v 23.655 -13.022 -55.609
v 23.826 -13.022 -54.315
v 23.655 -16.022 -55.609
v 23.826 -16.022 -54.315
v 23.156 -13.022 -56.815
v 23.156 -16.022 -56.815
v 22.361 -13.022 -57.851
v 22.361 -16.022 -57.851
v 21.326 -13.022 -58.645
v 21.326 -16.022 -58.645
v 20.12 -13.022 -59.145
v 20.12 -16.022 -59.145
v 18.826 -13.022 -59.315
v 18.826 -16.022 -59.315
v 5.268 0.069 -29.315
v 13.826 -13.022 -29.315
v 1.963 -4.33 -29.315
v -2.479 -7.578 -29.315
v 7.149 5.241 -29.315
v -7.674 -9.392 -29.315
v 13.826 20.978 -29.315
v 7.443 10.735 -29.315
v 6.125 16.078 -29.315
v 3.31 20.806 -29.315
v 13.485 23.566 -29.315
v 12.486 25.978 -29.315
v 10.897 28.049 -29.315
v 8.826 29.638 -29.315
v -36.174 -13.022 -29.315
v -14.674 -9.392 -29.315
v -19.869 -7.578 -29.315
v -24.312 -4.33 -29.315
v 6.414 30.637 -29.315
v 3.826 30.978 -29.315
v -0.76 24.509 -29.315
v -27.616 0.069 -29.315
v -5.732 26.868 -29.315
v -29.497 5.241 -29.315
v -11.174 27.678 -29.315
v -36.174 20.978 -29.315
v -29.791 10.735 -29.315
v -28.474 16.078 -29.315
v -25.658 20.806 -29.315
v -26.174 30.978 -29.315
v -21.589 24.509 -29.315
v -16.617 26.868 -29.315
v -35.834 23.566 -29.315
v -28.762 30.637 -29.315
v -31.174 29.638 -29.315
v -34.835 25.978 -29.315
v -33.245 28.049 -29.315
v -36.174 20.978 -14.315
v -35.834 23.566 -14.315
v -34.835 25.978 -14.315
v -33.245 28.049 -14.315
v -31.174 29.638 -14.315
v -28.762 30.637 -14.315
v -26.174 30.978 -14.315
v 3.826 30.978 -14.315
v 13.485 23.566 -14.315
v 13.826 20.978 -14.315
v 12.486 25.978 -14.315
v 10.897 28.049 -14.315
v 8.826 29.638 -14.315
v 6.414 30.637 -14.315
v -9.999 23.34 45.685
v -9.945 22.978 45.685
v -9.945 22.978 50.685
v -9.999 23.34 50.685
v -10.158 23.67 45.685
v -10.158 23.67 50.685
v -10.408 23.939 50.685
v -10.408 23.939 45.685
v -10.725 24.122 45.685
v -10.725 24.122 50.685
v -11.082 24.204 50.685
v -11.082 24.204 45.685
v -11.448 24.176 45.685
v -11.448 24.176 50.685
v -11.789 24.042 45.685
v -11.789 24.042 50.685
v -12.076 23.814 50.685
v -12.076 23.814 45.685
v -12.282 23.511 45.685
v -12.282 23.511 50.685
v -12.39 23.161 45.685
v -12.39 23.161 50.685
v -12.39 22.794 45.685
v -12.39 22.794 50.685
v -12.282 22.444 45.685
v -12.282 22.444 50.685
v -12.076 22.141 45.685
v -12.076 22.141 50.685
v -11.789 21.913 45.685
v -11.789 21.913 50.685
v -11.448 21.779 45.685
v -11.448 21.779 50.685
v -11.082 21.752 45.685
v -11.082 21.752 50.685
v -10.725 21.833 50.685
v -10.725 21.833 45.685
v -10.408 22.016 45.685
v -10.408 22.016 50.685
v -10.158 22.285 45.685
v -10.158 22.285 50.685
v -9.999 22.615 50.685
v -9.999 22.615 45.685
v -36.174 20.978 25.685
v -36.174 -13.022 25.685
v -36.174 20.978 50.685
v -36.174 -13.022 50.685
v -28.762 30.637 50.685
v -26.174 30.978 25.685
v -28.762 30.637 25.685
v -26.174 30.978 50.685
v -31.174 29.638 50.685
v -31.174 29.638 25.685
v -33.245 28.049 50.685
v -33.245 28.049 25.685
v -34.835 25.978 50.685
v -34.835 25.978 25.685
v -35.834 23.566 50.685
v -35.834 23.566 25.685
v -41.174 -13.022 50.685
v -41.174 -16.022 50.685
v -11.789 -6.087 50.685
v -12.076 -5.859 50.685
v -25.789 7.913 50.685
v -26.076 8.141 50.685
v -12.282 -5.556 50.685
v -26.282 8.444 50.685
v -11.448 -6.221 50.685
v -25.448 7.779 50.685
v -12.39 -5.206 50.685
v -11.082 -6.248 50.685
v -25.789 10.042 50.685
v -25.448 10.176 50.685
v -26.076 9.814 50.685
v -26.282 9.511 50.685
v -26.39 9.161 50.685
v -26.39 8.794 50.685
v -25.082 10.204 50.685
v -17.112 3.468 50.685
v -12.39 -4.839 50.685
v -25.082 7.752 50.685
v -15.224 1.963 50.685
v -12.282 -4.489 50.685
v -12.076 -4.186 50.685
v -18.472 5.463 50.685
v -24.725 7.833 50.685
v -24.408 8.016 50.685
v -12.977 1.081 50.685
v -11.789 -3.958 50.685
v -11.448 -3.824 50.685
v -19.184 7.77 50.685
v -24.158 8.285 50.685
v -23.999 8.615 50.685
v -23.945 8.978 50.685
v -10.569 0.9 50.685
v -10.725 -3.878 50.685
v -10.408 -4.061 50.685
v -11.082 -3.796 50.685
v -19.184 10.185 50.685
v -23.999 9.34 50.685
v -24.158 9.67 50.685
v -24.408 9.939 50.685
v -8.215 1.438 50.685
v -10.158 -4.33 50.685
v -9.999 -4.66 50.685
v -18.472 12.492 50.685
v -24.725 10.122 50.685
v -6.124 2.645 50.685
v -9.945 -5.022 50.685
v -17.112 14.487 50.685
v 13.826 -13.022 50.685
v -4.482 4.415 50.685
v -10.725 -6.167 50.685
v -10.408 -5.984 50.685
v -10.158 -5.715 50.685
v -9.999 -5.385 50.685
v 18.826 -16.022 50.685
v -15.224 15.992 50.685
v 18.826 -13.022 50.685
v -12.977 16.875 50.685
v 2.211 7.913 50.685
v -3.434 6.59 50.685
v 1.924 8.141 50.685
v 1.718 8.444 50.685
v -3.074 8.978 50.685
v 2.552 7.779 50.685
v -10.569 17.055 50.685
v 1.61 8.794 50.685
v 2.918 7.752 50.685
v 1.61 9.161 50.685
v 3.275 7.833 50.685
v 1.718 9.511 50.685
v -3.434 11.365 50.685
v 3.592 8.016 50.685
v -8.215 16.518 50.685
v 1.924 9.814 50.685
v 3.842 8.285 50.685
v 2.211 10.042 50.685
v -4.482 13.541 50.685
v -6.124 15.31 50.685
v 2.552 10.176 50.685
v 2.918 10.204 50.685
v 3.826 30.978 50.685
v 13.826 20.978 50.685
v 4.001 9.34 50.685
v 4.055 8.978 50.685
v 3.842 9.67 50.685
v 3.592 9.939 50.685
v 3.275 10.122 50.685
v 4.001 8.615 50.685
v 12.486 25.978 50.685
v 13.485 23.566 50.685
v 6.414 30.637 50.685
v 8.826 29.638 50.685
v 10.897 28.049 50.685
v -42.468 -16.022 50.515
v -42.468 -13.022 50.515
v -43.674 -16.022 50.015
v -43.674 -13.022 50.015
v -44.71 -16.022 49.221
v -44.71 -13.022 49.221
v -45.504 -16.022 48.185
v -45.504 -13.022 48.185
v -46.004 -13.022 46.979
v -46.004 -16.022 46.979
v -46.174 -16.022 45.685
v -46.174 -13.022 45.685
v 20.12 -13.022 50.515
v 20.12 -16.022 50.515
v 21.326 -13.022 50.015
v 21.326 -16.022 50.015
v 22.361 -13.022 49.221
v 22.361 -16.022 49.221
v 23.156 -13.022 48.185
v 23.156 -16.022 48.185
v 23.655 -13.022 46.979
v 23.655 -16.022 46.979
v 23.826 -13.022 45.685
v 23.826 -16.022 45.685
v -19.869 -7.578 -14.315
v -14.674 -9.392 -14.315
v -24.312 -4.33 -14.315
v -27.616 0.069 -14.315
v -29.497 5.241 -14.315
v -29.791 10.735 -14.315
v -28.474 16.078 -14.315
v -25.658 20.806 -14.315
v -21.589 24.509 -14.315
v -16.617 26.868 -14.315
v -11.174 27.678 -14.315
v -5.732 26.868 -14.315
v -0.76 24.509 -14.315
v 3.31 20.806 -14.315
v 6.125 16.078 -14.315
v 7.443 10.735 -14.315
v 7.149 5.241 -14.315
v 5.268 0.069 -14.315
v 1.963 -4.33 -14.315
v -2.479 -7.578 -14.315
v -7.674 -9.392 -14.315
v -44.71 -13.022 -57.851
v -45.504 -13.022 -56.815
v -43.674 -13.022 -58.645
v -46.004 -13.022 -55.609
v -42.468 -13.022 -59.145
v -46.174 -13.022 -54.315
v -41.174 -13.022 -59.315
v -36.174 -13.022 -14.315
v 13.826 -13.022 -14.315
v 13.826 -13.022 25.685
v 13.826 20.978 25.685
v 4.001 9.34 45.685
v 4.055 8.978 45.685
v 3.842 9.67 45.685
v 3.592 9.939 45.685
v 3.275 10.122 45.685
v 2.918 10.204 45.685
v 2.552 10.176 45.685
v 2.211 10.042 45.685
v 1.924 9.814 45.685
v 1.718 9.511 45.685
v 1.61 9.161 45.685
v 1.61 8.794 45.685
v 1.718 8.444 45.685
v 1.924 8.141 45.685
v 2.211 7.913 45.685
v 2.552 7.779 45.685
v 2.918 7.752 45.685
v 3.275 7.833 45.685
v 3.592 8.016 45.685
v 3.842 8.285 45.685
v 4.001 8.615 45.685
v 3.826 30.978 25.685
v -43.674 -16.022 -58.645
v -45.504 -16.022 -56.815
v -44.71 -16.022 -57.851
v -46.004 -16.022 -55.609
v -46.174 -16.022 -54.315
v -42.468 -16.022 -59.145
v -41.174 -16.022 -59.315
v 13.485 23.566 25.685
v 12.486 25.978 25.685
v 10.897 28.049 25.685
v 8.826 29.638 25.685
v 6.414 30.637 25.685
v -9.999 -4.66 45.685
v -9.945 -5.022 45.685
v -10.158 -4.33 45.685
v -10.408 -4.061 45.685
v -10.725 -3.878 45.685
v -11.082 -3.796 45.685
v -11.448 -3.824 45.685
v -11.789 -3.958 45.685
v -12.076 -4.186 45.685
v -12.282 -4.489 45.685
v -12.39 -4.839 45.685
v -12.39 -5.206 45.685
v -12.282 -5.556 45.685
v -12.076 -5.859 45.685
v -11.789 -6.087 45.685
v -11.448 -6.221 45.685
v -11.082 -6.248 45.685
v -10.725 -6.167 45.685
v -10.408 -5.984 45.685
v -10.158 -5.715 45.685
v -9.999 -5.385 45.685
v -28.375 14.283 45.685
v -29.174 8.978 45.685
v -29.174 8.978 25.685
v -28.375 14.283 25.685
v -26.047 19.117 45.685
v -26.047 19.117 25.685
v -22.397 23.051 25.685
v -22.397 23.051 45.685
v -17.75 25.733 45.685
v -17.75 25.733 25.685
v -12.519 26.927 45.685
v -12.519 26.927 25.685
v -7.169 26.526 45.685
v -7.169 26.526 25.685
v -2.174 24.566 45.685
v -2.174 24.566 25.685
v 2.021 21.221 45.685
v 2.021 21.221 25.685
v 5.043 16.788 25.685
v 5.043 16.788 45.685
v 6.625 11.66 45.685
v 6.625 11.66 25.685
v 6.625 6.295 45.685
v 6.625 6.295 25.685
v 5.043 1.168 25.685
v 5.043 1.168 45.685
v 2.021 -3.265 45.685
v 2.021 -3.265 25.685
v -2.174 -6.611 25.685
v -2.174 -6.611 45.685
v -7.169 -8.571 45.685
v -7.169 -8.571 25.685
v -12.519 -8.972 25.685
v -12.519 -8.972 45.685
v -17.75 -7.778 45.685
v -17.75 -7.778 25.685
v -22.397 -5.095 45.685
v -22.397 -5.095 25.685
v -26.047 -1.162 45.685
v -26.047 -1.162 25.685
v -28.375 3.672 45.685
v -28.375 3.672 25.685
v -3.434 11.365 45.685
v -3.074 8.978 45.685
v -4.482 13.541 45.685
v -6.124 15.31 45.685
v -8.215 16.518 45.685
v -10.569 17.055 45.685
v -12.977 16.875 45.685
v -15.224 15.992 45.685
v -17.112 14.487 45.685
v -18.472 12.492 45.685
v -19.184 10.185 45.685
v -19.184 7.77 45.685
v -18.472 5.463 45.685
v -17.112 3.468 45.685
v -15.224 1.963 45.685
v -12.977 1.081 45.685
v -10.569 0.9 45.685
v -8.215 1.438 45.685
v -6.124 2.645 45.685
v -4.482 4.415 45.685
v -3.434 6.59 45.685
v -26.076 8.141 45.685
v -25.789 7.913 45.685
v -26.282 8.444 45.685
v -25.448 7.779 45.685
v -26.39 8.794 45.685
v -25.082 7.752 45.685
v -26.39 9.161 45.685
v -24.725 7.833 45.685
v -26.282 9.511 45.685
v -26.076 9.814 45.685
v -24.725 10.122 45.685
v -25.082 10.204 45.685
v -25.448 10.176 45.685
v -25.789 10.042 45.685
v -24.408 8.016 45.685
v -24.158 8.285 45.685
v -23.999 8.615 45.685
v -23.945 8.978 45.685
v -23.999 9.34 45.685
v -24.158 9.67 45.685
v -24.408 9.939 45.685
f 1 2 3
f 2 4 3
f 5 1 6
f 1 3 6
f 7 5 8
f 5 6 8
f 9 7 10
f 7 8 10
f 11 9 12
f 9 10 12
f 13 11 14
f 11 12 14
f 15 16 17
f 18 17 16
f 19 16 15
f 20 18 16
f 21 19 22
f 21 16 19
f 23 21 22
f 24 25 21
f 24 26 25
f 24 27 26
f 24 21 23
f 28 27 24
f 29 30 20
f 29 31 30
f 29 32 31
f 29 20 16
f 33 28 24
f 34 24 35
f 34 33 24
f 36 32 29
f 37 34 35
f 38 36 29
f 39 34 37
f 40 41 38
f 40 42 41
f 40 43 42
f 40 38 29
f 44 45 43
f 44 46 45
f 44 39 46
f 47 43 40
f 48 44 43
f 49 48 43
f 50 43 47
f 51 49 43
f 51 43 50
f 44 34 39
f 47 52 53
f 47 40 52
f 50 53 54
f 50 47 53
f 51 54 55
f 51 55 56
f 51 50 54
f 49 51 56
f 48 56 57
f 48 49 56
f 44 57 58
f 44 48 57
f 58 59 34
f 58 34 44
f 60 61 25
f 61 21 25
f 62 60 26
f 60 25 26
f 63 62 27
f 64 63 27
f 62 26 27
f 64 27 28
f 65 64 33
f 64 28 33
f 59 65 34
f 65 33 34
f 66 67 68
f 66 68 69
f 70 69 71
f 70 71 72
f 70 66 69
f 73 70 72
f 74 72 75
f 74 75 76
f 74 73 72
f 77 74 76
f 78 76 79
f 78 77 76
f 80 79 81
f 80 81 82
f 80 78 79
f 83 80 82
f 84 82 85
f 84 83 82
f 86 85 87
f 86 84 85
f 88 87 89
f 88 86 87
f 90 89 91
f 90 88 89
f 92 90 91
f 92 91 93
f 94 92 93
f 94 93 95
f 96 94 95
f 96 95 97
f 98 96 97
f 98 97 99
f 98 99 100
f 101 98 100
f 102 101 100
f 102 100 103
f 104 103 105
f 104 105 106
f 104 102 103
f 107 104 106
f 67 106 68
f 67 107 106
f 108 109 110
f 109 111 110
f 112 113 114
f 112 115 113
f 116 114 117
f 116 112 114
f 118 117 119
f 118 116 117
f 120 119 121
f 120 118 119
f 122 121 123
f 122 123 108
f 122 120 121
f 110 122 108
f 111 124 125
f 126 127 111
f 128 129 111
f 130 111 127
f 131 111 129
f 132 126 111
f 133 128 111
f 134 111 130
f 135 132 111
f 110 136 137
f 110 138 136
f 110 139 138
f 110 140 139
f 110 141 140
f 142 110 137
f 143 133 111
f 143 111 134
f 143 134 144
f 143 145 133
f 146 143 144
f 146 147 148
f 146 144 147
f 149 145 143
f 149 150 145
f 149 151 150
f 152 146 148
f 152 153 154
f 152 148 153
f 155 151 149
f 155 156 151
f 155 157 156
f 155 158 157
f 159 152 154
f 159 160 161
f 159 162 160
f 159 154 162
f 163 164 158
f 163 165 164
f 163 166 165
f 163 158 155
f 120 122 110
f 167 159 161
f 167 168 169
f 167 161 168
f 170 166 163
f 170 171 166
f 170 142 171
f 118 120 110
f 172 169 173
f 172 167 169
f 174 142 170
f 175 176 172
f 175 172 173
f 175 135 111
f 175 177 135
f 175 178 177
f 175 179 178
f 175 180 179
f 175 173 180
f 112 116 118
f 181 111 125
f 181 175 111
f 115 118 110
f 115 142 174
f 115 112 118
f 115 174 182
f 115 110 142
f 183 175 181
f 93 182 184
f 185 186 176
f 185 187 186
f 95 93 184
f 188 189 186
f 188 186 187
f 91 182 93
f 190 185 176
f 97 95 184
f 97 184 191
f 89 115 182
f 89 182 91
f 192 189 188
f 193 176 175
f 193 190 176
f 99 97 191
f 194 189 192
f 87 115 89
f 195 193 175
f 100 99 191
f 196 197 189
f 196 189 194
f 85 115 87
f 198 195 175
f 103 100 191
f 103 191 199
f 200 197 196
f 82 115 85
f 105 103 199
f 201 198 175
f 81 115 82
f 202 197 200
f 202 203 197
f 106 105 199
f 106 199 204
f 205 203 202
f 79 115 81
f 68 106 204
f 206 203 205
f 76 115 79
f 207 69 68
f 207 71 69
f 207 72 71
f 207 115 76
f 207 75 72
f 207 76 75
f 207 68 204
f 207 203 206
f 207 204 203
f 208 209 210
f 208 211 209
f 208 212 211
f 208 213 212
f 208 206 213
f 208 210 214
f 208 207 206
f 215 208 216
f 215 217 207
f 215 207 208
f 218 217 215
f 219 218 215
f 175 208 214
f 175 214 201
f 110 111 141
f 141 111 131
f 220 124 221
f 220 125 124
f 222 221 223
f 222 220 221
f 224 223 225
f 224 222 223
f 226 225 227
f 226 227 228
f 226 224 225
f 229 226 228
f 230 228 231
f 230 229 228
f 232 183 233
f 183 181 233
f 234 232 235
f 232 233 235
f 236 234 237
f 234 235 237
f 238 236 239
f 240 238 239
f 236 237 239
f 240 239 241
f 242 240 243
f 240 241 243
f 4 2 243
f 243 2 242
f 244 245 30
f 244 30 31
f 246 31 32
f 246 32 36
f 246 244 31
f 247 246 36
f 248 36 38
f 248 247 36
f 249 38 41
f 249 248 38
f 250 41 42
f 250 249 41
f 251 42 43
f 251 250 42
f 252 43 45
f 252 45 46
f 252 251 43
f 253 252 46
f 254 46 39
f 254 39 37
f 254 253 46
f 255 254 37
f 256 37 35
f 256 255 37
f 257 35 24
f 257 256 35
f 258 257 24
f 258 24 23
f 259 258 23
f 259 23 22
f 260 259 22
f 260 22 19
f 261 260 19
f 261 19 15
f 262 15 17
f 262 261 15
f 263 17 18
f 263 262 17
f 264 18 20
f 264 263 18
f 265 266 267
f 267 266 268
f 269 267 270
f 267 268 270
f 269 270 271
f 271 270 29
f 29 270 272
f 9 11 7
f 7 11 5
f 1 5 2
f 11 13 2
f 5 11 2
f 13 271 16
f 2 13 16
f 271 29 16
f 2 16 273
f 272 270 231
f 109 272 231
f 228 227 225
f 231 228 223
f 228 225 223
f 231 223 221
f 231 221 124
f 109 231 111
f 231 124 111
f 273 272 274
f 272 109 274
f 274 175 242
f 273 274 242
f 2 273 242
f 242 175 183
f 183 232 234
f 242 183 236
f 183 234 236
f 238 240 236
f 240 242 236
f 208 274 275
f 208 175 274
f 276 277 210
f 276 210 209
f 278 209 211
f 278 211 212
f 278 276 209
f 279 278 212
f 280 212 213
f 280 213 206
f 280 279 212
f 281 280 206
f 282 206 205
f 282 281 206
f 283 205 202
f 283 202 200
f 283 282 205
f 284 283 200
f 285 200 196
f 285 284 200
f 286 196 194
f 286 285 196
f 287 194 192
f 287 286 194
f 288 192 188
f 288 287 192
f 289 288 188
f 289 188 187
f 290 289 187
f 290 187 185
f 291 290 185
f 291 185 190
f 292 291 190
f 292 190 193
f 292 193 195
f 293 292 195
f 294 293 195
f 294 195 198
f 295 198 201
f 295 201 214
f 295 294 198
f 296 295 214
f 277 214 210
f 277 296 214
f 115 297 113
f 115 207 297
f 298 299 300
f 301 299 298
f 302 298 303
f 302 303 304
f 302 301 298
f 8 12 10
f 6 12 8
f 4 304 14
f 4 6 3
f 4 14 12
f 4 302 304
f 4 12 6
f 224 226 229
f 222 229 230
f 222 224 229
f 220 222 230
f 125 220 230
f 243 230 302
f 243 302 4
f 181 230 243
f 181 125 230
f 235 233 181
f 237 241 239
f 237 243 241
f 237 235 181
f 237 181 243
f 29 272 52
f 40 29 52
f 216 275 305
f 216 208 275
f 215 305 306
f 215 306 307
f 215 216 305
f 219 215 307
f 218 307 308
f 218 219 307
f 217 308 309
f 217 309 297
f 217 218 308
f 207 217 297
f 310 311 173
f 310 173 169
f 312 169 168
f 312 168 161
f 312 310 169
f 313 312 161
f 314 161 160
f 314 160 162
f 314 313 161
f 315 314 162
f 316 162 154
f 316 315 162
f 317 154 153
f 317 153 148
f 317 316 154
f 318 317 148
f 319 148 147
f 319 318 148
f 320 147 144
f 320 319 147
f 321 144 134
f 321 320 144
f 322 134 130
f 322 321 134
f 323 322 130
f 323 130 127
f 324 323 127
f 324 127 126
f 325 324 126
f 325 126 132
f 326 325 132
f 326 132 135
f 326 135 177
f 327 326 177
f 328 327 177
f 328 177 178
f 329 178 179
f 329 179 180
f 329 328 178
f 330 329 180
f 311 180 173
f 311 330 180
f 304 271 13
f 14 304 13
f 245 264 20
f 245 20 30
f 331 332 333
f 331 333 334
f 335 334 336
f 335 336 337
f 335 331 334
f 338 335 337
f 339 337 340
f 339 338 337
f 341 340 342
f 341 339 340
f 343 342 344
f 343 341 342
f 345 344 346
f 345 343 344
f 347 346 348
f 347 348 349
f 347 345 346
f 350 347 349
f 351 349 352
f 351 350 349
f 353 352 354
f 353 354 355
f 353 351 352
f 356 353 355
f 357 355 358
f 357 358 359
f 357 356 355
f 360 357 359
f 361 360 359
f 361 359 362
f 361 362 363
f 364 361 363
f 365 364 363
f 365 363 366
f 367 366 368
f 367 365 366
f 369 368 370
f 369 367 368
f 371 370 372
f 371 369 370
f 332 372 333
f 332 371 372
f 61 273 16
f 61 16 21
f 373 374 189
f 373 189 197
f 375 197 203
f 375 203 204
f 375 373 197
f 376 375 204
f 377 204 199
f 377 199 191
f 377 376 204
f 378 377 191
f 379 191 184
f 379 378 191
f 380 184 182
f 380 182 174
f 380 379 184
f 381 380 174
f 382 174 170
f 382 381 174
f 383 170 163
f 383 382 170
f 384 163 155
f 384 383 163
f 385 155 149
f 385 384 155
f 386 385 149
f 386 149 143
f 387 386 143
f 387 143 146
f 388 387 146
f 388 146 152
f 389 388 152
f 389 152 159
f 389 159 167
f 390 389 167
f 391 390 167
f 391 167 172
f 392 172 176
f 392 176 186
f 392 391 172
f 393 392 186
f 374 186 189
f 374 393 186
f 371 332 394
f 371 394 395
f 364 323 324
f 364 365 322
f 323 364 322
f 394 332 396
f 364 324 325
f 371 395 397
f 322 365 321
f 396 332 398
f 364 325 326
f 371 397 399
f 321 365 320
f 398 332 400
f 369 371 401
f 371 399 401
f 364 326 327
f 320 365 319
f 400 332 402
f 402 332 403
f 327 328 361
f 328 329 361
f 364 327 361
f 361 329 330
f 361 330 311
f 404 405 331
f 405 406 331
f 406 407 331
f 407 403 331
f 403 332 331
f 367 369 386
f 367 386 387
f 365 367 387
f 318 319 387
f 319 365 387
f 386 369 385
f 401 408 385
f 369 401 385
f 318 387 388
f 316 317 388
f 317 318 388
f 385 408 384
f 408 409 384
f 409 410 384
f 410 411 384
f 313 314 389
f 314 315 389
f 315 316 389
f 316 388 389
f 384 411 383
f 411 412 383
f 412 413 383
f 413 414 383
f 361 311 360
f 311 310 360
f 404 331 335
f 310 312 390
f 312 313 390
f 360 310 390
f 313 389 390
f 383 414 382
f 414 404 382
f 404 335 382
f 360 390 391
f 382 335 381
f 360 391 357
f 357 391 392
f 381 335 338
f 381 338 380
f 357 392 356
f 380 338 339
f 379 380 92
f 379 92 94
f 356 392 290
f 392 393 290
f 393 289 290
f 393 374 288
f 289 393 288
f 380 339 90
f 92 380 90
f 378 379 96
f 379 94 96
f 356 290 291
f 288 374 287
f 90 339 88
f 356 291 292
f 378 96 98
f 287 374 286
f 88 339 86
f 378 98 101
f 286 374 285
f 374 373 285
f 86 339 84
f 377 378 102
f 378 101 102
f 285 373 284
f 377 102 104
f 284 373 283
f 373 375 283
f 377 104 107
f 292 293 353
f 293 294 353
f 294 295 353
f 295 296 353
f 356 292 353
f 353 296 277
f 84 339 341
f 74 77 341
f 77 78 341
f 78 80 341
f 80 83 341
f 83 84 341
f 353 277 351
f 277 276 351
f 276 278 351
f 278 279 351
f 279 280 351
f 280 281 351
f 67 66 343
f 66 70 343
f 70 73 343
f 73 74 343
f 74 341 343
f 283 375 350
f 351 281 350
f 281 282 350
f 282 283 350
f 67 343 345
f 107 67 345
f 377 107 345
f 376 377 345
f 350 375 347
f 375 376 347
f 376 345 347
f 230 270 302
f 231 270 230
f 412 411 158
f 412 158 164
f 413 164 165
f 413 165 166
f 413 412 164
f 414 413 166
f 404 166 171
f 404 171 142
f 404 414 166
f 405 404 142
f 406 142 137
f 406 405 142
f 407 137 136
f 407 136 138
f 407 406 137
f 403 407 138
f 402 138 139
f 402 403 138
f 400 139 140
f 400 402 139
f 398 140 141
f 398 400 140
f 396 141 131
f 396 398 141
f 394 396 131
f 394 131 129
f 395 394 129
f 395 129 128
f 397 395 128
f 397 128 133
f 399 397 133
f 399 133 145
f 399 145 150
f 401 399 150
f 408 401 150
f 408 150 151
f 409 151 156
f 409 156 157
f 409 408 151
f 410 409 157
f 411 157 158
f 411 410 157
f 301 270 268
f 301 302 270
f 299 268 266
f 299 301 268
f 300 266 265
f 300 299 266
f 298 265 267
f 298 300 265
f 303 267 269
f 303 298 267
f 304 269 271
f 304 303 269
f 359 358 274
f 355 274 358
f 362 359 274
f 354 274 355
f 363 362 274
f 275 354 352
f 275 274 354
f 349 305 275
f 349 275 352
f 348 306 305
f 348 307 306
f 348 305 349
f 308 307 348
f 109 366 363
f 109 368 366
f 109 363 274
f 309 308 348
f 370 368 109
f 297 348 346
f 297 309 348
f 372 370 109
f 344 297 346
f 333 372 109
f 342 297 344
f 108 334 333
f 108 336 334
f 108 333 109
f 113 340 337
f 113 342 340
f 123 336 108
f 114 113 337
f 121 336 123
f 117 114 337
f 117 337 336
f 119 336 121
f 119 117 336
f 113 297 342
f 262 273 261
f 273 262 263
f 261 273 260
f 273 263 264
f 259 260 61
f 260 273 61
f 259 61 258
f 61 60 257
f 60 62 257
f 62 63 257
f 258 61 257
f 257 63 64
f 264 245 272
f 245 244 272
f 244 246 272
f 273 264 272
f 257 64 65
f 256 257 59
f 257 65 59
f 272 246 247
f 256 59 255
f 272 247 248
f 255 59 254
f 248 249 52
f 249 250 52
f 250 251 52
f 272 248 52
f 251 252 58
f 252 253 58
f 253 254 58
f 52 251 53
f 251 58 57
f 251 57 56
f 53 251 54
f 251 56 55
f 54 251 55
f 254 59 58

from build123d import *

# Parameters (mm, degrees)
SKETCH1_W           = 50
SKETCH1_H           = 44
SKETCH1_R           = 1.2295
SKETCH1_R_2         = 8.1
BOSS_EXTRUDE1_DEPTH = 5
SKETCH2_W           = 50
SKETCH2_H           = 44
SKETCH2_R           = 18
BOSS_EXTRUDE2_DEPTH = 20
SKETCH4_W           = 70
SKETCH4_H           = 110
BOSS_EXTRUDE3_DEPTH = 3
SKETCH6_W           = 50
SKETCH6_H           = 44
BOSS_EXTRUDE4_DEPTH = 15
FILLET1_R           = 10
FILLET3_R           = 5


with BuildPart() as part:
    # Sketch1 → Boss-Extrude1 (new body)
    with BuildSketch(Plane.XY.offset(45.685001235)):
        with Locations((-11.17428291, 8.97761735)):
            Rectangle(SKETCH1_W, SKETCH1_H)
        with Locations((-11.17428291, 22.97761735)):
            Circle(SKETCH1_R, mode=Mode.SUBTRACT)
        with Locations((2.82571709, 8.97761735)):
            Circle(SKETCH1_R, mode=Mode.SUBTRACT)
        with Locations((-11.17428291, -5.02238265)):
            Circle(SKETCH1_R, mode=Mode.SUBTRACT)
        with Locations((-25.17428291, 8.97761735)):
            Circle(SKETCH1_R, mode=Mode.SUBTRACT)
        with Locations((-11.17428291, 8.97761735)):
            Circle(SKETCH1_R_2, mode=Mode.SUBTRACT)
    extrude(amount=BOSS_EXTRUDE1_DEPTH)

    # Sketch2 → Boss-Extrude2 (add)
    with BuildSketch(Plane(origin=(0, 0, 45.685001235), x_dir=(-1, 0, 0), z_dir=(0, 0, -1))):
        with Locations((11.17428291, 8.97761735)):
            Rectangle(SKETCH2_W, SKETCH2_H)
        with Locations((11.17428291, 8.97761735)):
            Circle(SKETCH2_R, mode=Mode.SUBTRACT)
    extrude(amount=BOSS_EXTRUDE2_DEPTH)

    # Sketch4 → Boss-Extrude3 (add)
    with BuildSketch(Plane.XZ.offset(13.02238265)):
        with Locations((-11.17428291, -4.314998765)):
            Rectangle(SKETCH4_W, SKETCH4_H)
    extrude(amount=BOSS_EXTRUDE3_DEPTH)

    # Sketch6 → Boss-Extrude4 (add)
    with BuildSketch(Plane(origin=(0, 0, -14.314998765), x_dir=(-1, 0, 0), z_dir=(0, 0, -1))):
        with Locations((11.17428291, 8.97761735)):
            Rectangle(SKETCH6_W, SKETCH6_H)
        with BuildLine():
            Line((7.67428291, -9.391922655), (14.67428291, -9.391922655))
            ThreePointArc((14.67428291, -9.391922655), (11.17428291, 27.67761735), (7.67428291, -9.391922655))
        make_face(mode=Mode.SUBTRACT)
    extrude(amount=BOSS_EXTRUDE4_DEPTH)

    # Fillet1
    fillet1_edges = [part.edges().sort_by_distance(p)[0] for p in [
        (13.82571709, 30.97761735, -21.814998765),
        (-36.17428291, 30.97761735, -21.814998765),
        (-36.17428291, 30.97761735, 38.185001235),
        (13.82571709, 30.97761735, 38.185001235),
    ]]
    fillet(fillet1_edges, radius=FILLET1_R)

    # Fillet3
    fillet3_edges = [part.edges().sort_by_distance(p)[0] for p in [
        (23.82571709, -14.52238265, -59.314998765),
        (23.82571709, -14.52238265, 50.685001235),
        (-46.17428291, -14.52238265, 50.685001235),
        (-46.17428291, -14.52238265, -59.314998765),
    ]]
    fillet(fillet3_edges, radius=FILLET3_R)


solid = part.part
